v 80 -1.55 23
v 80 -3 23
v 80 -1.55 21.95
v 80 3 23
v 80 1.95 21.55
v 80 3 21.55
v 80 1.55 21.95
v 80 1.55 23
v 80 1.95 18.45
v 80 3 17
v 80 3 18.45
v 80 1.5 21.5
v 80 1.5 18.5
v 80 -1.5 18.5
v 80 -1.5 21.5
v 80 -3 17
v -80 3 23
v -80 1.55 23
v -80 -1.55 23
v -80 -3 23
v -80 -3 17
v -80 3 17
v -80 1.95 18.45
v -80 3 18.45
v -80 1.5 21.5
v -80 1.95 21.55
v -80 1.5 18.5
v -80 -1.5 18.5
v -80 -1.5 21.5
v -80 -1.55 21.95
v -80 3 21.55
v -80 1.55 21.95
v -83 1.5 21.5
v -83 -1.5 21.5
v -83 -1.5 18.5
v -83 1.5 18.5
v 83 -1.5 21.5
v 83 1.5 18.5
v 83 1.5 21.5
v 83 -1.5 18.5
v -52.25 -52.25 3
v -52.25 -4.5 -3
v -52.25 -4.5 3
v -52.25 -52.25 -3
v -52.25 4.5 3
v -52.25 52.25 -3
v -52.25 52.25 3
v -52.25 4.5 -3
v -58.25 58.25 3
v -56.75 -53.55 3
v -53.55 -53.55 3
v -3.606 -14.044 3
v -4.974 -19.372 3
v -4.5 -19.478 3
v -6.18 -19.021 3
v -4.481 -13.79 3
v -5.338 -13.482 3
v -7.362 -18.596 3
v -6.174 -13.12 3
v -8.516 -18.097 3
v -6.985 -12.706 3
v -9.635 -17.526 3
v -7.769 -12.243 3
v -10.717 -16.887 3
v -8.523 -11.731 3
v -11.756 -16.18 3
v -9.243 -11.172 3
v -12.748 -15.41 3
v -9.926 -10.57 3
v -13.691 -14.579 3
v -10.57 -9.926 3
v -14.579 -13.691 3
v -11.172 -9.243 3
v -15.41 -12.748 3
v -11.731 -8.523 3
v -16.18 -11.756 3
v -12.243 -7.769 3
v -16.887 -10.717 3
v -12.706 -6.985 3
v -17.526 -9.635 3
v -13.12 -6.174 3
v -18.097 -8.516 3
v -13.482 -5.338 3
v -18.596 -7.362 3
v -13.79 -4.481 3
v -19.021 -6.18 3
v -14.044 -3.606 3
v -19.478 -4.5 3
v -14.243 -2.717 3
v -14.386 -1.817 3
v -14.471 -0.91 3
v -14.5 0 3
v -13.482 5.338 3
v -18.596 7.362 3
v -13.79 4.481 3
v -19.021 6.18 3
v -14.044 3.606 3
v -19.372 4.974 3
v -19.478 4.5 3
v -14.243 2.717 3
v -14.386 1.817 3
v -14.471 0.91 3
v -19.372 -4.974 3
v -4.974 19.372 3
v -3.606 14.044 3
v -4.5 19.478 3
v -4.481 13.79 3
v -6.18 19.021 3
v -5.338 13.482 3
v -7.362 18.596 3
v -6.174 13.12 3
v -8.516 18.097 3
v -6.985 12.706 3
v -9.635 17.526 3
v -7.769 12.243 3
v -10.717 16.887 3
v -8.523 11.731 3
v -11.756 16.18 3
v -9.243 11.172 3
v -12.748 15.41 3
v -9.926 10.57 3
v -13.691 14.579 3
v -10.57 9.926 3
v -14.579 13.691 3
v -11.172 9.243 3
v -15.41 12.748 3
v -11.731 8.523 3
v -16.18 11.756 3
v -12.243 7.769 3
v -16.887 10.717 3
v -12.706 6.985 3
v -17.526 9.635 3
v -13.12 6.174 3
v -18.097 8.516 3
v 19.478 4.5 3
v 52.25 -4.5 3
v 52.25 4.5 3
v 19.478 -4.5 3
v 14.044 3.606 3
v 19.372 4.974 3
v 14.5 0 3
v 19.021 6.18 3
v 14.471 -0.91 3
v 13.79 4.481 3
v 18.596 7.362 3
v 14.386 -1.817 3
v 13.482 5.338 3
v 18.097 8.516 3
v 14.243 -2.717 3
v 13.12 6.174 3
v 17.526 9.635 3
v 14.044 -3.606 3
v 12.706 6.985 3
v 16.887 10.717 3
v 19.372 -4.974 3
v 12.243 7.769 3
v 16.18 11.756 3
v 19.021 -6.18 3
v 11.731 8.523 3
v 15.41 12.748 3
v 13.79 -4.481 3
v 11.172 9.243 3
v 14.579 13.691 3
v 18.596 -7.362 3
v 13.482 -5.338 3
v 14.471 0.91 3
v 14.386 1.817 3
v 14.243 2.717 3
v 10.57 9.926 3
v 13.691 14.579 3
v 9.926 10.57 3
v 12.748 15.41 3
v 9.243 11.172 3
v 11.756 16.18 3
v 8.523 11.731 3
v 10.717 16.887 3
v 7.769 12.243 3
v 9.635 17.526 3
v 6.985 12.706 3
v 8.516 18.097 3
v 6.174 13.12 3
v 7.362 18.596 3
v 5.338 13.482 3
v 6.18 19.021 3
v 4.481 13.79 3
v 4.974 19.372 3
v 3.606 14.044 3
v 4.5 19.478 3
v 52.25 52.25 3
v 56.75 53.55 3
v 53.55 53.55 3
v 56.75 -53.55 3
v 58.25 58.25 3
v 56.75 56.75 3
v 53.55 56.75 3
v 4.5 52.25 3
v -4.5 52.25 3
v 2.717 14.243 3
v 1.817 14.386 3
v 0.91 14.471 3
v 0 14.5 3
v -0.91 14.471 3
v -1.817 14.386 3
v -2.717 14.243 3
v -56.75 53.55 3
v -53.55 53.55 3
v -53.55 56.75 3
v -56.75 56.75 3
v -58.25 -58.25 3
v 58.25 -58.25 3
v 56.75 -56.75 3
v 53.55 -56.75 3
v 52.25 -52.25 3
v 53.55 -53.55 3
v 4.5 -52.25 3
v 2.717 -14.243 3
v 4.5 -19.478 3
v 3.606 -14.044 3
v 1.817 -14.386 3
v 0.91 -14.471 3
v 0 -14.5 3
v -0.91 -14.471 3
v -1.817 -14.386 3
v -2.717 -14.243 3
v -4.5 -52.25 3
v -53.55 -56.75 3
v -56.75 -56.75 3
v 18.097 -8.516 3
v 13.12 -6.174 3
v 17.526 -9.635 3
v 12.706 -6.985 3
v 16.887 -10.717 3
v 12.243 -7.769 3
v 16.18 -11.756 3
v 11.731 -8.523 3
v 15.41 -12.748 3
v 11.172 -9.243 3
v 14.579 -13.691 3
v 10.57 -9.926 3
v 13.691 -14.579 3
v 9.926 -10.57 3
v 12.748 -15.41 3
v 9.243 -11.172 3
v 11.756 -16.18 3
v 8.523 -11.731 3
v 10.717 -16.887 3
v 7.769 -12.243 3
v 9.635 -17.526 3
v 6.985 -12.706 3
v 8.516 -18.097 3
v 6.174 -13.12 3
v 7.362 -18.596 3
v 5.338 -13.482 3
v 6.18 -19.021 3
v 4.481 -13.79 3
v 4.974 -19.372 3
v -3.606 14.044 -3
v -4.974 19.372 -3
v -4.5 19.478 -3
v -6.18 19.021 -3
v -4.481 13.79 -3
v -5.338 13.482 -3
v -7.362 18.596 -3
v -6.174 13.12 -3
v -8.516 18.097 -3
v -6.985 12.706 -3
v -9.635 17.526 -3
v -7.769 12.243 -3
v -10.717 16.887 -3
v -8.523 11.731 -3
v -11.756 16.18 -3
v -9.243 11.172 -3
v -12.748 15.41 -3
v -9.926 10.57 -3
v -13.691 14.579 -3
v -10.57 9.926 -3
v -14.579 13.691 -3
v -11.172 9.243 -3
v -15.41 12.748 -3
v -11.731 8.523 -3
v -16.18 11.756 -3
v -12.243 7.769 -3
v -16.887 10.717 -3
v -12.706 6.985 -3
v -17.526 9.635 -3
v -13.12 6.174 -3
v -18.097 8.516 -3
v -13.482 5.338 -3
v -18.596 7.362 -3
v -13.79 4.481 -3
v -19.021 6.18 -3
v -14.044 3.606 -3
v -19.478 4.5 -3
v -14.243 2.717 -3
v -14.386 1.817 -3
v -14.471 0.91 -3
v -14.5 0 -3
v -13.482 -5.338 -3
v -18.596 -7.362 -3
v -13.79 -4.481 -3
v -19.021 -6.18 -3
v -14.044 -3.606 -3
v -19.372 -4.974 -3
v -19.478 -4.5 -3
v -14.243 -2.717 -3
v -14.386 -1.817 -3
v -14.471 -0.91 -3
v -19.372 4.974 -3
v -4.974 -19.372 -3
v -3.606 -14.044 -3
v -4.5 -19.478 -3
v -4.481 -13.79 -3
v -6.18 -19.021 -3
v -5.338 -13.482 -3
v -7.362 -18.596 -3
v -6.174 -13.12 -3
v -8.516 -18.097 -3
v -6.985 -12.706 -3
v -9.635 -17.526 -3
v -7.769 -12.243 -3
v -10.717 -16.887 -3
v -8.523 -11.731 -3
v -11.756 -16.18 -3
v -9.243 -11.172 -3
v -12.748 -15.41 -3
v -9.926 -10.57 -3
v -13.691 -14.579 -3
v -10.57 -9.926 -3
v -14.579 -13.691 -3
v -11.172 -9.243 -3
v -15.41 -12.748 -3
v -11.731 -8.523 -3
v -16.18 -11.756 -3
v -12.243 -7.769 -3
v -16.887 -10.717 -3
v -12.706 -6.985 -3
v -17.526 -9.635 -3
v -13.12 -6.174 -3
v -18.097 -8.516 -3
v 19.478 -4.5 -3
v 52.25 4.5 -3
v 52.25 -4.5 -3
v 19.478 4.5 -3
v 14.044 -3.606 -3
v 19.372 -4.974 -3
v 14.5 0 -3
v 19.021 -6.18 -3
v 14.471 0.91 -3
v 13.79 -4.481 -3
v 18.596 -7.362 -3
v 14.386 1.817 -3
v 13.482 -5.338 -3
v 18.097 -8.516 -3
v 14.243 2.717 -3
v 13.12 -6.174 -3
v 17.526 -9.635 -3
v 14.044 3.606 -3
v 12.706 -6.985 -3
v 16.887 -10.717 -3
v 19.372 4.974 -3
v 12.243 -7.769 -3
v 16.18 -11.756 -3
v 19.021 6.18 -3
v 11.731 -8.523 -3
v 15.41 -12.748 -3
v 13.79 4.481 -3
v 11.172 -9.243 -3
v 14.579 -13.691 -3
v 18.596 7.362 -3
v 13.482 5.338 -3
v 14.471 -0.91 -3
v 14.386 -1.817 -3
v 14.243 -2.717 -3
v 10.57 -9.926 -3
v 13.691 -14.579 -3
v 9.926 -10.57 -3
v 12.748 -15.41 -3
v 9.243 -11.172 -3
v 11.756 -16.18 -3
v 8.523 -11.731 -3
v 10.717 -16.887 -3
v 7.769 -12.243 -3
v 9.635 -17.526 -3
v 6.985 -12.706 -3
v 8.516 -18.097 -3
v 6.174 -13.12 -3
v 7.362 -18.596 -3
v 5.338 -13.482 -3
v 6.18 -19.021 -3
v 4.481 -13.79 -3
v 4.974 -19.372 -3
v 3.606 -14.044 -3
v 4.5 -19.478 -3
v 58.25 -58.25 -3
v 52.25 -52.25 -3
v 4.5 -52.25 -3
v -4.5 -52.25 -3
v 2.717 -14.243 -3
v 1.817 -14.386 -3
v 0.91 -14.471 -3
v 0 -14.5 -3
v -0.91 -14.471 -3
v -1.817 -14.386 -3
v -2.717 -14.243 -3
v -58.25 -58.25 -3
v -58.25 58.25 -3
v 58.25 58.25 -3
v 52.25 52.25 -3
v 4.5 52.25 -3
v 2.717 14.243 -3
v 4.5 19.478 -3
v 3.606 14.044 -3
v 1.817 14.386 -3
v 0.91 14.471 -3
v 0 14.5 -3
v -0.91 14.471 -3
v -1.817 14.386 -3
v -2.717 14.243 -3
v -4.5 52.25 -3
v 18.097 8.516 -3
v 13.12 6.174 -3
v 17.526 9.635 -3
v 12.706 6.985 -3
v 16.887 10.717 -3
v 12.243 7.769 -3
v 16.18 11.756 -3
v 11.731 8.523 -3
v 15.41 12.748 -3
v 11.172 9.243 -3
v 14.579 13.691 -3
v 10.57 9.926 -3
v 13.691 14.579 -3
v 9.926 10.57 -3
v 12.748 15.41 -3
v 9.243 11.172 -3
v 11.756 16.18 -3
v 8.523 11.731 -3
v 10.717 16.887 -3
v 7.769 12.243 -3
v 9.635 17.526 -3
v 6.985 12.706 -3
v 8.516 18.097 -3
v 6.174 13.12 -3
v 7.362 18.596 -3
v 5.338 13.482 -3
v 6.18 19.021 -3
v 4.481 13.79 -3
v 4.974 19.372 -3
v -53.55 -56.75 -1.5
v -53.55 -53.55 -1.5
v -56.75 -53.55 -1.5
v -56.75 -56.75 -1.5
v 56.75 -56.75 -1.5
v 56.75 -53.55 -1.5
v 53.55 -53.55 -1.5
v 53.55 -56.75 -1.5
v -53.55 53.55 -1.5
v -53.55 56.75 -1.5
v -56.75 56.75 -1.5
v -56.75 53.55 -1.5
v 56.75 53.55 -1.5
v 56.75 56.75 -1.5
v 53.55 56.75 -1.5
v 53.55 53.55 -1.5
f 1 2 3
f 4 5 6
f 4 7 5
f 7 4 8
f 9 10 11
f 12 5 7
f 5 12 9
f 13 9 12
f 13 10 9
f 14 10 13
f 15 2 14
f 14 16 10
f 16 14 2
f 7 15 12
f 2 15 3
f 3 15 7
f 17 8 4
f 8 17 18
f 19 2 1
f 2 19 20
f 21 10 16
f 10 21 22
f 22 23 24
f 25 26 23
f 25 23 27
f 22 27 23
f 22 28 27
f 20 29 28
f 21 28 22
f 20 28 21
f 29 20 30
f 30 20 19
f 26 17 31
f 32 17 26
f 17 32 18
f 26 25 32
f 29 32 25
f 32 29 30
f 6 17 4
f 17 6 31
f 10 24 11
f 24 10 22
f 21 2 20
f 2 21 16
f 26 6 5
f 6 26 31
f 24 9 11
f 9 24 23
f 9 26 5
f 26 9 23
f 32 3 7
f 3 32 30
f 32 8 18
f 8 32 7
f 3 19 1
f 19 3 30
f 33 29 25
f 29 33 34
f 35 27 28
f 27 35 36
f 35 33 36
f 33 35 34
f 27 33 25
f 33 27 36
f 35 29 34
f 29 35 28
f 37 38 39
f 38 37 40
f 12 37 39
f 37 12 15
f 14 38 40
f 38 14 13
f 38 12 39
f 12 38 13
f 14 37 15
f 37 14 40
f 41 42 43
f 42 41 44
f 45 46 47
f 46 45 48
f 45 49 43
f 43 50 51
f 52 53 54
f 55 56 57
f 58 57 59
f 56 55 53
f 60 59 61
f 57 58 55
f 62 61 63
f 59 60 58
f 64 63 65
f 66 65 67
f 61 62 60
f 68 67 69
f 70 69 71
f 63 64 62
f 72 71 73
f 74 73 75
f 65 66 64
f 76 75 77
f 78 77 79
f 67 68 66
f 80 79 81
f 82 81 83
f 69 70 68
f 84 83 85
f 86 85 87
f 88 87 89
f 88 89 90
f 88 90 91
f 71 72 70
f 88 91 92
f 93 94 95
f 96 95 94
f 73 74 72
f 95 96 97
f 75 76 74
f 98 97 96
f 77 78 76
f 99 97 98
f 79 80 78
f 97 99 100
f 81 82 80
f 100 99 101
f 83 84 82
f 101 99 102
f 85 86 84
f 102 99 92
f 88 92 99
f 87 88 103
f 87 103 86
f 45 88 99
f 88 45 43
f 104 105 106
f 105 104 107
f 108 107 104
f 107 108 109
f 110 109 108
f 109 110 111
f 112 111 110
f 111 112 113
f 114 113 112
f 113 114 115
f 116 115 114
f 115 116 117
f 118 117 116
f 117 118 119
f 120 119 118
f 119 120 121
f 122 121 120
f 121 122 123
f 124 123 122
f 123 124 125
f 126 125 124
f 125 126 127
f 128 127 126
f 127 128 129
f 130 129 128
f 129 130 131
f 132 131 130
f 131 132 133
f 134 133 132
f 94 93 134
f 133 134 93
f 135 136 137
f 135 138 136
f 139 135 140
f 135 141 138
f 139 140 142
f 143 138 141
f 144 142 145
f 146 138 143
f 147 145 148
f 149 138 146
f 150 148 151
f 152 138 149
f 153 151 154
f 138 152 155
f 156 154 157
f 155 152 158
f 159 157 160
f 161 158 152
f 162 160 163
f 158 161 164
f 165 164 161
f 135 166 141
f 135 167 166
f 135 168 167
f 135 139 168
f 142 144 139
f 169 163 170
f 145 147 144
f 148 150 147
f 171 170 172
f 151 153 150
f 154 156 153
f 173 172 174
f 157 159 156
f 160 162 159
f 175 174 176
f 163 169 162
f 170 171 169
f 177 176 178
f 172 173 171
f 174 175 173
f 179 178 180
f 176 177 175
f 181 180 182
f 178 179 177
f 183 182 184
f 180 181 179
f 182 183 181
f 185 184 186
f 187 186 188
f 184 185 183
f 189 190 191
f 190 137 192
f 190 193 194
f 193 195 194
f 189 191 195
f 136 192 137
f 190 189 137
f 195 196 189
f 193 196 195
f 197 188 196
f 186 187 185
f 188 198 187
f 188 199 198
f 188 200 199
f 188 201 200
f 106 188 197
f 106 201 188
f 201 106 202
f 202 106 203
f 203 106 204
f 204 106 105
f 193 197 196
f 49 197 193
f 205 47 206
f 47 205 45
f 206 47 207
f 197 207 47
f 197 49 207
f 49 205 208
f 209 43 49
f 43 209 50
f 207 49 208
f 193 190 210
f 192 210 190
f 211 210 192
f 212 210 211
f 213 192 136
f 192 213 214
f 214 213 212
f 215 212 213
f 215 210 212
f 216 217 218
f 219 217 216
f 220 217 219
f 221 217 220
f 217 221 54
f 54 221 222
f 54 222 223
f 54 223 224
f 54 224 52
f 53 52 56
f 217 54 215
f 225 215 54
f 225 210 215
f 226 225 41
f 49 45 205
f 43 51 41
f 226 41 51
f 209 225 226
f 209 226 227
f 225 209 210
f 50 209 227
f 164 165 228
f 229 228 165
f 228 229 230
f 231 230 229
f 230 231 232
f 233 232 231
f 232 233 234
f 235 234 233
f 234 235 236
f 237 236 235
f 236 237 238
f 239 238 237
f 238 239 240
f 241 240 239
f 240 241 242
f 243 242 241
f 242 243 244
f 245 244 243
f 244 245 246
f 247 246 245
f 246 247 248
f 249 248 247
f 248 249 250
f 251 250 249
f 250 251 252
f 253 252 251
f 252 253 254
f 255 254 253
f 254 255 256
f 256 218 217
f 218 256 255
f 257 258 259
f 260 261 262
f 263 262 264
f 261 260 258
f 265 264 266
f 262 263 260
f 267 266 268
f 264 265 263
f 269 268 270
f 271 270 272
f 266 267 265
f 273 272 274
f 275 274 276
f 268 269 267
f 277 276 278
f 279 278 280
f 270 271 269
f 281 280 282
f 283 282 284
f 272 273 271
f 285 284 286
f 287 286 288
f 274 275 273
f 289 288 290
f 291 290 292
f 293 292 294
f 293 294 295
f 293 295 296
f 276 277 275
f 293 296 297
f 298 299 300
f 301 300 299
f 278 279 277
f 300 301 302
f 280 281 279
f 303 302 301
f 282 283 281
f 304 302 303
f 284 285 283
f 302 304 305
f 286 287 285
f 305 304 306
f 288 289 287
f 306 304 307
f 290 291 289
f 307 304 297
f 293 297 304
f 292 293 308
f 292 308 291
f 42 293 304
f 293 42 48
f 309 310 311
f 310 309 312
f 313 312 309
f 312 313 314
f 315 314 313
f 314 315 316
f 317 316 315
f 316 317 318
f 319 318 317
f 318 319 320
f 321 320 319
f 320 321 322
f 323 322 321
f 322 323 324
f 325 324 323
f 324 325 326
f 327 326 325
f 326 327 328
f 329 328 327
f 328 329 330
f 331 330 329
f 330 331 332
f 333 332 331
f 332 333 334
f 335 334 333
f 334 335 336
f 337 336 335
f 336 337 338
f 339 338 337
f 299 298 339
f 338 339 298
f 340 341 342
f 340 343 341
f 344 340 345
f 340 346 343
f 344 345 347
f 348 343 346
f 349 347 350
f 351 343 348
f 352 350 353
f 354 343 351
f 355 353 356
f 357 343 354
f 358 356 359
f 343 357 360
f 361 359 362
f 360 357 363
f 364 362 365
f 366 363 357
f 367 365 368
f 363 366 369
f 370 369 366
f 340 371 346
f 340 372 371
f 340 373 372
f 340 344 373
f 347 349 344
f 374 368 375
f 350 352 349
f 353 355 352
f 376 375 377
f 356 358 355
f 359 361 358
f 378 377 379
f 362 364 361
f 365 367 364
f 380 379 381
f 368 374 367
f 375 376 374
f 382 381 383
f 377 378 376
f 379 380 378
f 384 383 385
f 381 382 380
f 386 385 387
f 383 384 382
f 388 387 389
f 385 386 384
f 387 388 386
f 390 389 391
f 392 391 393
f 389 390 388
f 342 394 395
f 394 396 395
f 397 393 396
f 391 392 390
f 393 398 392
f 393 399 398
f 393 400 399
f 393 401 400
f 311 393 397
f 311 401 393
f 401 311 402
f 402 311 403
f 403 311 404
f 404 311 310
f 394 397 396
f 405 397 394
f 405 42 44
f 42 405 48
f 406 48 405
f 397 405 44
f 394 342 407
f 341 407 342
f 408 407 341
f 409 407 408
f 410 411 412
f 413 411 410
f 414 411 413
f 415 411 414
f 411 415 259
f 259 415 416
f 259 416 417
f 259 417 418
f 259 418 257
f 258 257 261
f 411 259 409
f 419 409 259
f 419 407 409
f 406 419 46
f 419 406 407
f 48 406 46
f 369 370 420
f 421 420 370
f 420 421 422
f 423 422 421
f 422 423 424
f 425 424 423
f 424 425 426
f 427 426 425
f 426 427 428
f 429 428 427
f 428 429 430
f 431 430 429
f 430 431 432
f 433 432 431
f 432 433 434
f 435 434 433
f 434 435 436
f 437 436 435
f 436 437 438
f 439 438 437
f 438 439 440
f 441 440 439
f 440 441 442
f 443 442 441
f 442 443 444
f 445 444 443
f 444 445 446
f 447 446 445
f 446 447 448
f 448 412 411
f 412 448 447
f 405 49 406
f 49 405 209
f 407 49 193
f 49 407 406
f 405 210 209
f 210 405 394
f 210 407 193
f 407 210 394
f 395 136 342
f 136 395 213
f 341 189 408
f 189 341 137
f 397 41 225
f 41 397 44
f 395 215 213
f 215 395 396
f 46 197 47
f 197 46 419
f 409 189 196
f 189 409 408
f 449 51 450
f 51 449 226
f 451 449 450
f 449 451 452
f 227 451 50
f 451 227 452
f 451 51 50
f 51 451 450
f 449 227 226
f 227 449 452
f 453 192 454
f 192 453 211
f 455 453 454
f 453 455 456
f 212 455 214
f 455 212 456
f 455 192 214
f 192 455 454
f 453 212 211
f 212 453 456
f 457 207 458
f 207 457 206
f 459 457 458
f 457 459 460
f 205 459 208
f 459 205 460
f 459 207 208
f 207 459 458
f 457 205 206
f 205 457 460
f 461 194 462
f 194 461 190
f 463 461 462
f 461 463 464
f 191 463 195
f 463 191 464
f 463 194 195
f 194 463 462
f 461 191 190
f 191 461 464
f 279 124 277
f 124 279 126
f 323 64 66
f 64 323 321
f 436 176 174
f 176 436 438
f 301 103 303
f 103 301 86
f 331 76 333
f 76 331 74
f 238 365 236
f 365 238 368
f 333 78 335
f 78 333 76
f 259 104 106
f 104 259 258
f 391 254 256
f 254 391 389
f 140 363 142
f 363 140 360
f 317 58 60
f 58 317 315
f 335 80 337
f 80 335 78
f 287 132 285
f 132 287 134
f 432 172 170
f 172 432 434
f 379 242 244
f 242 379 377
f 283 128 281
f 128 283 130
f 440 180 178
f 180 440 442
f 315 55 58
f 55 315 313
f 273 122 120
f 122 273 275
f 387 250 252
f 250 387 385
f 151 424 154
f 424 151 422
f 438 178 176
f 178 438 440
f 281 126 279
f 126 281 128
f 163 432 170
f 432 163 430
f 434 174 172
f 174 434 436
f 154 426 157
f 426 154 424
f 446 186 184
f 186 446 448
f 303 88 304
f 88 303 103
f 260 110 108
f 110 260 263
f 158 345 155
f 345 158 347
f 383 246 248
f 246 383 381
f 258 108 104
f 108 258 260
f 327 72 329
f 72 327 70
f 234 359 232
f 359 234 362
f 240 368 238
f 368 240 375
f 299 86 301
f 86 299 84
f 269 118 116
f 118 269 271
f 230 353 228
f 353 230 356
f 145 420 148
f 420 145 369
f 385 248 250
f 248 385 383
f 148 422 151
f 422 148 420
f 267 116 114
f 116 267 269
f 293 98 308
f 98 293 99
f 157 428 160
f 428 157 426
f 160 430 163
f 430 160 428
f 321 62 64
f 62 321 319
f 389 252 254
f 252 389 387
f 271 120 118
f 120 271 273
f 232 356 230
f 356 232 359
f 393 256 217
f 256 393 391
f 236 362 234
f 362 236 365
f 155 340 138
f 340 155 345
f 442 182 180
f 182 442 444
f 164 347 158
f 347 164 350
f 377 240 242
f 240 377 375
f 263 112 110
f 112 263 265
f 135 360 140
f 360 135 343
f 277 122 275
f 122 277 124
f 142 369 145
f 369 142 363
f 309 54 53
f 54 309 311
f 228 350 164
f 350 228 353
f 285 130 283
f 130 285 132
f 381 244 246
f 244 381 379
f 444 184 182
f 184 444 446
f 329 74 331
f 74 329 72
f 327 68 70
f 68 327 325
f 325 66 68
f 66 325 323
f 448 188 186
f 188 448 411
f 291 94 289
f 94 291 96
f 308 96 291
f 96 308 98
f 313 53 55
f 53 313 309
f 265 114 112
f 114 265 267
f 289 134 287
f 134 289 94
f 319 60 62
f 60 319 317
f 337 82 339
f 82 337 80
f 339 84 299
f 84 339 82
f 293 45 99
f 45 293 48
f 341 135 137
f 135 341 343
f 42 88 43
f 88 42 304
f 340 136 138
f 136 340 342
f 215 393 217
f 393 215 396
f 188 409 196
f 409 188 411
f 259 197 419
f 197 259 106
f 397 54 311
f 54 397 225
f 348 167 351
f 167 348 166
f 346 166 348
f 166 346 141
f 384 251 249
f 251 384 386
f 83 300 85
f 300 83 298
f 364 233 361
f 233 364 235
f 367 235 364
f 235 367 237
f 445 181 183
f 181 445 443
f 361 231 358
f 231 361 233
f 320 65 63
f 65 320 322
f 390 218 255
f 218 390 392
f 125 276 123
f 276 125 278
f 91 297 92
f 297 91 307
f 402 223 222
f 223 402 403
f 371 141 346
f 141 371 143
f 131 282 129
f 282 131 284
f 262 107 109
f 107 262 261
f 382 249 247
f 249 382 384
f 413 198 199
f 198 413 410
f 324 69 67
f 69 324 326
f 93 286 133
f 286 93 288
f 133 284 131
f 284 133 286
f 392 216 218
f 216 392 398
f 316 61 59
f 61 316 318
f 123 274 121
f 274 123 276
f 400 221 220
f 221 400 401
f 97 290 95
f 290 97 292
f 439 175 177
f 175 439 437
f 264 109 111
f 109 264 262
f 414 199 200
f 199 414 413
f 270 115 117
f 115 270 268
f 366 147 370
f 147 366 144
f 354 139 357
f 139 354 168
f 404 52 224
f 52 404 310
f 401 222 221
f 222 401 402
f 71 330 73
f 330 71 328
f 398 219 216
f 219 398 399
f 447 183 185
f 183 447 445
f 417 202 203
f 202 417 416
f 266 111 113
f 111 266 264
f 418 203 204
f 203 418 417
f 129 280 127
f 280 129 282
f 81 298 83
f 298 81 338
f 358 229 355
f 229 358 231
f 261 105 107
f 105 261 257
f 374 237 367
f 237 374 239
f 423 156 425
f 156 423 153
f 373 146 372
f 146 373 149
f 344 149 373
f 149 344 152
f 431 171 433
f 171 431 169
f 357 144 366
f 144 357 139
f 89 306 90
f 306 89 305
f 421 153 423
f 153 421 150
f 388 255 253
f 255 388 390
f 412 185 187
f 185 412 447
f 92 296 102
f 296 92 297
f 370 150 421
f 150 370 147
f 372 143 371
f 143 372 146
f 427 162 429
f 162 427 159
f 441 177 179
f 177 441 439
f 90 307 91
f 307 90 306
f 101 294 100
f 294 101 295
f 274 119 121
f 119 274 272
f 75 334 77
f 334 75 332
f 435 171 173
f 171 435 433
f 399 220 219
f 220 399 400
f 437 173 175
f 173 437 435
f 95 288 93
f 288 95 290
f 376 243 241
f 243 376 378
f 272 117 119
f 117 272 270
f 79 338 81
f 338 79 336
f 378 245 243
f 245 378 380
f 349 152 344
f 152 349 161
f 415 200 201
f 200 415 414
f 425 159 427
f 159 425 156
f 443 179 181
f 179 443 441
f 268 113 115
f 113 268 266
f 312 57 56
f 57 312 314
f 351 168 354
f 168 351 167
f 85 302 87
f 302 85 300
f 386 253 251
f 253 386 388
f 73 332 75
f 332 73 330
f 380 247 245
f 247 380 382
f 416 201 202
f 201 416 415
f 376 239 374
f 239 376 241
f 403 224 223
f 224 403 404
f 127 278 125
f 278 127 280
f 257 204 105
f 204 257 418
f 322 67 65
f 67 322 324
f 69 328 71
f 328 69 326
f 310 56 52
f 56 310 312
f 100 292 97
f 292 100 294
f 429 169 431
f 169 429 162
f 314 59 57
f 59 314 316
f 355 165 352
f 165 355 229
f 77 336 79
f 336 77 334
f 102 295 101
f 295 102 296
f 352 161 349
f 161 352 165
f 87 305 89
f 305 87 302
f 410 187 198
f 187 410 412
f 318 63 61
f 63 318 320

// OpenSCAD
/* [Image] */
// Height
h=160;
// Width
w=106.5;
// Thickness
t=3;

/* [Hidden] */
e14 = 14;
e14_outer = 20;

translate([0,0,20]) corner();
outer();
inner();

module inner() {
    difference() {
        union() {
            cylinder(h=2*t, r=e14_outer, $fn=100, center=true);
            cube([w, 3*t, 2*t], center=true);
            cube([3*t, w, 2*t], center=true);
        }
        cylinder(h=100, r=e14+0.5, $fn=100, center=true);
    }
};

module outer() {
    difference() {
        union() {
            translate([-(w/2 + t-1), 0, 0]) cube([2*t,w+4*t-2,2*t], center=true);
            translate([+(w/2 + t-1), 0, 0]) cube([2*t,w+4*t-2,2*t], center=true);
            translate([0, -(w/2 + t-1), 0]) cube([w-2,2*t,2*t], center=true);
            translate([0, +(w/2 + t-1), 0]) cube([w-2,2*t,2*t], center=true);
        }
        translate([-(w/2 + t-1.1), -(w/2 + t-1.1), 10])  cube([t+0.2, t+0.2, t+20], center=true);
        translate([+(w/2 + t-1.1), -(w/2 + t-1.1), 10])  cube([t+0.2, t+0.2, t+20], center=true);
        translate([-(w/2 + t-1.1), +(w/2 + t-1.1), 10])  cube([t+0.2, t+0.2, t+20], center=true);
        translate([+(w/2 + t-1.1), +(w/2 + t-1.1), 10])  cube([t+0.2, t+0.2, t+20], center=true);
    }
}

module corner() {
    difference() {
        cube([h, 2*t, 2*t], center=true);
        translate([0, t+0.5, 0]) cube([2*h, t+0.1, t+0.1], center=true);
        translate([0, 0, t+0.5]) cube([2*h, t+0.1, t+0.1], center=true);
    }
    translate([-h/2-t/2,0,0]) cube([t,t,t], center=true);
    translate([+h/2+t/2,0,0]) cube([t,t,t], center=true);
}
